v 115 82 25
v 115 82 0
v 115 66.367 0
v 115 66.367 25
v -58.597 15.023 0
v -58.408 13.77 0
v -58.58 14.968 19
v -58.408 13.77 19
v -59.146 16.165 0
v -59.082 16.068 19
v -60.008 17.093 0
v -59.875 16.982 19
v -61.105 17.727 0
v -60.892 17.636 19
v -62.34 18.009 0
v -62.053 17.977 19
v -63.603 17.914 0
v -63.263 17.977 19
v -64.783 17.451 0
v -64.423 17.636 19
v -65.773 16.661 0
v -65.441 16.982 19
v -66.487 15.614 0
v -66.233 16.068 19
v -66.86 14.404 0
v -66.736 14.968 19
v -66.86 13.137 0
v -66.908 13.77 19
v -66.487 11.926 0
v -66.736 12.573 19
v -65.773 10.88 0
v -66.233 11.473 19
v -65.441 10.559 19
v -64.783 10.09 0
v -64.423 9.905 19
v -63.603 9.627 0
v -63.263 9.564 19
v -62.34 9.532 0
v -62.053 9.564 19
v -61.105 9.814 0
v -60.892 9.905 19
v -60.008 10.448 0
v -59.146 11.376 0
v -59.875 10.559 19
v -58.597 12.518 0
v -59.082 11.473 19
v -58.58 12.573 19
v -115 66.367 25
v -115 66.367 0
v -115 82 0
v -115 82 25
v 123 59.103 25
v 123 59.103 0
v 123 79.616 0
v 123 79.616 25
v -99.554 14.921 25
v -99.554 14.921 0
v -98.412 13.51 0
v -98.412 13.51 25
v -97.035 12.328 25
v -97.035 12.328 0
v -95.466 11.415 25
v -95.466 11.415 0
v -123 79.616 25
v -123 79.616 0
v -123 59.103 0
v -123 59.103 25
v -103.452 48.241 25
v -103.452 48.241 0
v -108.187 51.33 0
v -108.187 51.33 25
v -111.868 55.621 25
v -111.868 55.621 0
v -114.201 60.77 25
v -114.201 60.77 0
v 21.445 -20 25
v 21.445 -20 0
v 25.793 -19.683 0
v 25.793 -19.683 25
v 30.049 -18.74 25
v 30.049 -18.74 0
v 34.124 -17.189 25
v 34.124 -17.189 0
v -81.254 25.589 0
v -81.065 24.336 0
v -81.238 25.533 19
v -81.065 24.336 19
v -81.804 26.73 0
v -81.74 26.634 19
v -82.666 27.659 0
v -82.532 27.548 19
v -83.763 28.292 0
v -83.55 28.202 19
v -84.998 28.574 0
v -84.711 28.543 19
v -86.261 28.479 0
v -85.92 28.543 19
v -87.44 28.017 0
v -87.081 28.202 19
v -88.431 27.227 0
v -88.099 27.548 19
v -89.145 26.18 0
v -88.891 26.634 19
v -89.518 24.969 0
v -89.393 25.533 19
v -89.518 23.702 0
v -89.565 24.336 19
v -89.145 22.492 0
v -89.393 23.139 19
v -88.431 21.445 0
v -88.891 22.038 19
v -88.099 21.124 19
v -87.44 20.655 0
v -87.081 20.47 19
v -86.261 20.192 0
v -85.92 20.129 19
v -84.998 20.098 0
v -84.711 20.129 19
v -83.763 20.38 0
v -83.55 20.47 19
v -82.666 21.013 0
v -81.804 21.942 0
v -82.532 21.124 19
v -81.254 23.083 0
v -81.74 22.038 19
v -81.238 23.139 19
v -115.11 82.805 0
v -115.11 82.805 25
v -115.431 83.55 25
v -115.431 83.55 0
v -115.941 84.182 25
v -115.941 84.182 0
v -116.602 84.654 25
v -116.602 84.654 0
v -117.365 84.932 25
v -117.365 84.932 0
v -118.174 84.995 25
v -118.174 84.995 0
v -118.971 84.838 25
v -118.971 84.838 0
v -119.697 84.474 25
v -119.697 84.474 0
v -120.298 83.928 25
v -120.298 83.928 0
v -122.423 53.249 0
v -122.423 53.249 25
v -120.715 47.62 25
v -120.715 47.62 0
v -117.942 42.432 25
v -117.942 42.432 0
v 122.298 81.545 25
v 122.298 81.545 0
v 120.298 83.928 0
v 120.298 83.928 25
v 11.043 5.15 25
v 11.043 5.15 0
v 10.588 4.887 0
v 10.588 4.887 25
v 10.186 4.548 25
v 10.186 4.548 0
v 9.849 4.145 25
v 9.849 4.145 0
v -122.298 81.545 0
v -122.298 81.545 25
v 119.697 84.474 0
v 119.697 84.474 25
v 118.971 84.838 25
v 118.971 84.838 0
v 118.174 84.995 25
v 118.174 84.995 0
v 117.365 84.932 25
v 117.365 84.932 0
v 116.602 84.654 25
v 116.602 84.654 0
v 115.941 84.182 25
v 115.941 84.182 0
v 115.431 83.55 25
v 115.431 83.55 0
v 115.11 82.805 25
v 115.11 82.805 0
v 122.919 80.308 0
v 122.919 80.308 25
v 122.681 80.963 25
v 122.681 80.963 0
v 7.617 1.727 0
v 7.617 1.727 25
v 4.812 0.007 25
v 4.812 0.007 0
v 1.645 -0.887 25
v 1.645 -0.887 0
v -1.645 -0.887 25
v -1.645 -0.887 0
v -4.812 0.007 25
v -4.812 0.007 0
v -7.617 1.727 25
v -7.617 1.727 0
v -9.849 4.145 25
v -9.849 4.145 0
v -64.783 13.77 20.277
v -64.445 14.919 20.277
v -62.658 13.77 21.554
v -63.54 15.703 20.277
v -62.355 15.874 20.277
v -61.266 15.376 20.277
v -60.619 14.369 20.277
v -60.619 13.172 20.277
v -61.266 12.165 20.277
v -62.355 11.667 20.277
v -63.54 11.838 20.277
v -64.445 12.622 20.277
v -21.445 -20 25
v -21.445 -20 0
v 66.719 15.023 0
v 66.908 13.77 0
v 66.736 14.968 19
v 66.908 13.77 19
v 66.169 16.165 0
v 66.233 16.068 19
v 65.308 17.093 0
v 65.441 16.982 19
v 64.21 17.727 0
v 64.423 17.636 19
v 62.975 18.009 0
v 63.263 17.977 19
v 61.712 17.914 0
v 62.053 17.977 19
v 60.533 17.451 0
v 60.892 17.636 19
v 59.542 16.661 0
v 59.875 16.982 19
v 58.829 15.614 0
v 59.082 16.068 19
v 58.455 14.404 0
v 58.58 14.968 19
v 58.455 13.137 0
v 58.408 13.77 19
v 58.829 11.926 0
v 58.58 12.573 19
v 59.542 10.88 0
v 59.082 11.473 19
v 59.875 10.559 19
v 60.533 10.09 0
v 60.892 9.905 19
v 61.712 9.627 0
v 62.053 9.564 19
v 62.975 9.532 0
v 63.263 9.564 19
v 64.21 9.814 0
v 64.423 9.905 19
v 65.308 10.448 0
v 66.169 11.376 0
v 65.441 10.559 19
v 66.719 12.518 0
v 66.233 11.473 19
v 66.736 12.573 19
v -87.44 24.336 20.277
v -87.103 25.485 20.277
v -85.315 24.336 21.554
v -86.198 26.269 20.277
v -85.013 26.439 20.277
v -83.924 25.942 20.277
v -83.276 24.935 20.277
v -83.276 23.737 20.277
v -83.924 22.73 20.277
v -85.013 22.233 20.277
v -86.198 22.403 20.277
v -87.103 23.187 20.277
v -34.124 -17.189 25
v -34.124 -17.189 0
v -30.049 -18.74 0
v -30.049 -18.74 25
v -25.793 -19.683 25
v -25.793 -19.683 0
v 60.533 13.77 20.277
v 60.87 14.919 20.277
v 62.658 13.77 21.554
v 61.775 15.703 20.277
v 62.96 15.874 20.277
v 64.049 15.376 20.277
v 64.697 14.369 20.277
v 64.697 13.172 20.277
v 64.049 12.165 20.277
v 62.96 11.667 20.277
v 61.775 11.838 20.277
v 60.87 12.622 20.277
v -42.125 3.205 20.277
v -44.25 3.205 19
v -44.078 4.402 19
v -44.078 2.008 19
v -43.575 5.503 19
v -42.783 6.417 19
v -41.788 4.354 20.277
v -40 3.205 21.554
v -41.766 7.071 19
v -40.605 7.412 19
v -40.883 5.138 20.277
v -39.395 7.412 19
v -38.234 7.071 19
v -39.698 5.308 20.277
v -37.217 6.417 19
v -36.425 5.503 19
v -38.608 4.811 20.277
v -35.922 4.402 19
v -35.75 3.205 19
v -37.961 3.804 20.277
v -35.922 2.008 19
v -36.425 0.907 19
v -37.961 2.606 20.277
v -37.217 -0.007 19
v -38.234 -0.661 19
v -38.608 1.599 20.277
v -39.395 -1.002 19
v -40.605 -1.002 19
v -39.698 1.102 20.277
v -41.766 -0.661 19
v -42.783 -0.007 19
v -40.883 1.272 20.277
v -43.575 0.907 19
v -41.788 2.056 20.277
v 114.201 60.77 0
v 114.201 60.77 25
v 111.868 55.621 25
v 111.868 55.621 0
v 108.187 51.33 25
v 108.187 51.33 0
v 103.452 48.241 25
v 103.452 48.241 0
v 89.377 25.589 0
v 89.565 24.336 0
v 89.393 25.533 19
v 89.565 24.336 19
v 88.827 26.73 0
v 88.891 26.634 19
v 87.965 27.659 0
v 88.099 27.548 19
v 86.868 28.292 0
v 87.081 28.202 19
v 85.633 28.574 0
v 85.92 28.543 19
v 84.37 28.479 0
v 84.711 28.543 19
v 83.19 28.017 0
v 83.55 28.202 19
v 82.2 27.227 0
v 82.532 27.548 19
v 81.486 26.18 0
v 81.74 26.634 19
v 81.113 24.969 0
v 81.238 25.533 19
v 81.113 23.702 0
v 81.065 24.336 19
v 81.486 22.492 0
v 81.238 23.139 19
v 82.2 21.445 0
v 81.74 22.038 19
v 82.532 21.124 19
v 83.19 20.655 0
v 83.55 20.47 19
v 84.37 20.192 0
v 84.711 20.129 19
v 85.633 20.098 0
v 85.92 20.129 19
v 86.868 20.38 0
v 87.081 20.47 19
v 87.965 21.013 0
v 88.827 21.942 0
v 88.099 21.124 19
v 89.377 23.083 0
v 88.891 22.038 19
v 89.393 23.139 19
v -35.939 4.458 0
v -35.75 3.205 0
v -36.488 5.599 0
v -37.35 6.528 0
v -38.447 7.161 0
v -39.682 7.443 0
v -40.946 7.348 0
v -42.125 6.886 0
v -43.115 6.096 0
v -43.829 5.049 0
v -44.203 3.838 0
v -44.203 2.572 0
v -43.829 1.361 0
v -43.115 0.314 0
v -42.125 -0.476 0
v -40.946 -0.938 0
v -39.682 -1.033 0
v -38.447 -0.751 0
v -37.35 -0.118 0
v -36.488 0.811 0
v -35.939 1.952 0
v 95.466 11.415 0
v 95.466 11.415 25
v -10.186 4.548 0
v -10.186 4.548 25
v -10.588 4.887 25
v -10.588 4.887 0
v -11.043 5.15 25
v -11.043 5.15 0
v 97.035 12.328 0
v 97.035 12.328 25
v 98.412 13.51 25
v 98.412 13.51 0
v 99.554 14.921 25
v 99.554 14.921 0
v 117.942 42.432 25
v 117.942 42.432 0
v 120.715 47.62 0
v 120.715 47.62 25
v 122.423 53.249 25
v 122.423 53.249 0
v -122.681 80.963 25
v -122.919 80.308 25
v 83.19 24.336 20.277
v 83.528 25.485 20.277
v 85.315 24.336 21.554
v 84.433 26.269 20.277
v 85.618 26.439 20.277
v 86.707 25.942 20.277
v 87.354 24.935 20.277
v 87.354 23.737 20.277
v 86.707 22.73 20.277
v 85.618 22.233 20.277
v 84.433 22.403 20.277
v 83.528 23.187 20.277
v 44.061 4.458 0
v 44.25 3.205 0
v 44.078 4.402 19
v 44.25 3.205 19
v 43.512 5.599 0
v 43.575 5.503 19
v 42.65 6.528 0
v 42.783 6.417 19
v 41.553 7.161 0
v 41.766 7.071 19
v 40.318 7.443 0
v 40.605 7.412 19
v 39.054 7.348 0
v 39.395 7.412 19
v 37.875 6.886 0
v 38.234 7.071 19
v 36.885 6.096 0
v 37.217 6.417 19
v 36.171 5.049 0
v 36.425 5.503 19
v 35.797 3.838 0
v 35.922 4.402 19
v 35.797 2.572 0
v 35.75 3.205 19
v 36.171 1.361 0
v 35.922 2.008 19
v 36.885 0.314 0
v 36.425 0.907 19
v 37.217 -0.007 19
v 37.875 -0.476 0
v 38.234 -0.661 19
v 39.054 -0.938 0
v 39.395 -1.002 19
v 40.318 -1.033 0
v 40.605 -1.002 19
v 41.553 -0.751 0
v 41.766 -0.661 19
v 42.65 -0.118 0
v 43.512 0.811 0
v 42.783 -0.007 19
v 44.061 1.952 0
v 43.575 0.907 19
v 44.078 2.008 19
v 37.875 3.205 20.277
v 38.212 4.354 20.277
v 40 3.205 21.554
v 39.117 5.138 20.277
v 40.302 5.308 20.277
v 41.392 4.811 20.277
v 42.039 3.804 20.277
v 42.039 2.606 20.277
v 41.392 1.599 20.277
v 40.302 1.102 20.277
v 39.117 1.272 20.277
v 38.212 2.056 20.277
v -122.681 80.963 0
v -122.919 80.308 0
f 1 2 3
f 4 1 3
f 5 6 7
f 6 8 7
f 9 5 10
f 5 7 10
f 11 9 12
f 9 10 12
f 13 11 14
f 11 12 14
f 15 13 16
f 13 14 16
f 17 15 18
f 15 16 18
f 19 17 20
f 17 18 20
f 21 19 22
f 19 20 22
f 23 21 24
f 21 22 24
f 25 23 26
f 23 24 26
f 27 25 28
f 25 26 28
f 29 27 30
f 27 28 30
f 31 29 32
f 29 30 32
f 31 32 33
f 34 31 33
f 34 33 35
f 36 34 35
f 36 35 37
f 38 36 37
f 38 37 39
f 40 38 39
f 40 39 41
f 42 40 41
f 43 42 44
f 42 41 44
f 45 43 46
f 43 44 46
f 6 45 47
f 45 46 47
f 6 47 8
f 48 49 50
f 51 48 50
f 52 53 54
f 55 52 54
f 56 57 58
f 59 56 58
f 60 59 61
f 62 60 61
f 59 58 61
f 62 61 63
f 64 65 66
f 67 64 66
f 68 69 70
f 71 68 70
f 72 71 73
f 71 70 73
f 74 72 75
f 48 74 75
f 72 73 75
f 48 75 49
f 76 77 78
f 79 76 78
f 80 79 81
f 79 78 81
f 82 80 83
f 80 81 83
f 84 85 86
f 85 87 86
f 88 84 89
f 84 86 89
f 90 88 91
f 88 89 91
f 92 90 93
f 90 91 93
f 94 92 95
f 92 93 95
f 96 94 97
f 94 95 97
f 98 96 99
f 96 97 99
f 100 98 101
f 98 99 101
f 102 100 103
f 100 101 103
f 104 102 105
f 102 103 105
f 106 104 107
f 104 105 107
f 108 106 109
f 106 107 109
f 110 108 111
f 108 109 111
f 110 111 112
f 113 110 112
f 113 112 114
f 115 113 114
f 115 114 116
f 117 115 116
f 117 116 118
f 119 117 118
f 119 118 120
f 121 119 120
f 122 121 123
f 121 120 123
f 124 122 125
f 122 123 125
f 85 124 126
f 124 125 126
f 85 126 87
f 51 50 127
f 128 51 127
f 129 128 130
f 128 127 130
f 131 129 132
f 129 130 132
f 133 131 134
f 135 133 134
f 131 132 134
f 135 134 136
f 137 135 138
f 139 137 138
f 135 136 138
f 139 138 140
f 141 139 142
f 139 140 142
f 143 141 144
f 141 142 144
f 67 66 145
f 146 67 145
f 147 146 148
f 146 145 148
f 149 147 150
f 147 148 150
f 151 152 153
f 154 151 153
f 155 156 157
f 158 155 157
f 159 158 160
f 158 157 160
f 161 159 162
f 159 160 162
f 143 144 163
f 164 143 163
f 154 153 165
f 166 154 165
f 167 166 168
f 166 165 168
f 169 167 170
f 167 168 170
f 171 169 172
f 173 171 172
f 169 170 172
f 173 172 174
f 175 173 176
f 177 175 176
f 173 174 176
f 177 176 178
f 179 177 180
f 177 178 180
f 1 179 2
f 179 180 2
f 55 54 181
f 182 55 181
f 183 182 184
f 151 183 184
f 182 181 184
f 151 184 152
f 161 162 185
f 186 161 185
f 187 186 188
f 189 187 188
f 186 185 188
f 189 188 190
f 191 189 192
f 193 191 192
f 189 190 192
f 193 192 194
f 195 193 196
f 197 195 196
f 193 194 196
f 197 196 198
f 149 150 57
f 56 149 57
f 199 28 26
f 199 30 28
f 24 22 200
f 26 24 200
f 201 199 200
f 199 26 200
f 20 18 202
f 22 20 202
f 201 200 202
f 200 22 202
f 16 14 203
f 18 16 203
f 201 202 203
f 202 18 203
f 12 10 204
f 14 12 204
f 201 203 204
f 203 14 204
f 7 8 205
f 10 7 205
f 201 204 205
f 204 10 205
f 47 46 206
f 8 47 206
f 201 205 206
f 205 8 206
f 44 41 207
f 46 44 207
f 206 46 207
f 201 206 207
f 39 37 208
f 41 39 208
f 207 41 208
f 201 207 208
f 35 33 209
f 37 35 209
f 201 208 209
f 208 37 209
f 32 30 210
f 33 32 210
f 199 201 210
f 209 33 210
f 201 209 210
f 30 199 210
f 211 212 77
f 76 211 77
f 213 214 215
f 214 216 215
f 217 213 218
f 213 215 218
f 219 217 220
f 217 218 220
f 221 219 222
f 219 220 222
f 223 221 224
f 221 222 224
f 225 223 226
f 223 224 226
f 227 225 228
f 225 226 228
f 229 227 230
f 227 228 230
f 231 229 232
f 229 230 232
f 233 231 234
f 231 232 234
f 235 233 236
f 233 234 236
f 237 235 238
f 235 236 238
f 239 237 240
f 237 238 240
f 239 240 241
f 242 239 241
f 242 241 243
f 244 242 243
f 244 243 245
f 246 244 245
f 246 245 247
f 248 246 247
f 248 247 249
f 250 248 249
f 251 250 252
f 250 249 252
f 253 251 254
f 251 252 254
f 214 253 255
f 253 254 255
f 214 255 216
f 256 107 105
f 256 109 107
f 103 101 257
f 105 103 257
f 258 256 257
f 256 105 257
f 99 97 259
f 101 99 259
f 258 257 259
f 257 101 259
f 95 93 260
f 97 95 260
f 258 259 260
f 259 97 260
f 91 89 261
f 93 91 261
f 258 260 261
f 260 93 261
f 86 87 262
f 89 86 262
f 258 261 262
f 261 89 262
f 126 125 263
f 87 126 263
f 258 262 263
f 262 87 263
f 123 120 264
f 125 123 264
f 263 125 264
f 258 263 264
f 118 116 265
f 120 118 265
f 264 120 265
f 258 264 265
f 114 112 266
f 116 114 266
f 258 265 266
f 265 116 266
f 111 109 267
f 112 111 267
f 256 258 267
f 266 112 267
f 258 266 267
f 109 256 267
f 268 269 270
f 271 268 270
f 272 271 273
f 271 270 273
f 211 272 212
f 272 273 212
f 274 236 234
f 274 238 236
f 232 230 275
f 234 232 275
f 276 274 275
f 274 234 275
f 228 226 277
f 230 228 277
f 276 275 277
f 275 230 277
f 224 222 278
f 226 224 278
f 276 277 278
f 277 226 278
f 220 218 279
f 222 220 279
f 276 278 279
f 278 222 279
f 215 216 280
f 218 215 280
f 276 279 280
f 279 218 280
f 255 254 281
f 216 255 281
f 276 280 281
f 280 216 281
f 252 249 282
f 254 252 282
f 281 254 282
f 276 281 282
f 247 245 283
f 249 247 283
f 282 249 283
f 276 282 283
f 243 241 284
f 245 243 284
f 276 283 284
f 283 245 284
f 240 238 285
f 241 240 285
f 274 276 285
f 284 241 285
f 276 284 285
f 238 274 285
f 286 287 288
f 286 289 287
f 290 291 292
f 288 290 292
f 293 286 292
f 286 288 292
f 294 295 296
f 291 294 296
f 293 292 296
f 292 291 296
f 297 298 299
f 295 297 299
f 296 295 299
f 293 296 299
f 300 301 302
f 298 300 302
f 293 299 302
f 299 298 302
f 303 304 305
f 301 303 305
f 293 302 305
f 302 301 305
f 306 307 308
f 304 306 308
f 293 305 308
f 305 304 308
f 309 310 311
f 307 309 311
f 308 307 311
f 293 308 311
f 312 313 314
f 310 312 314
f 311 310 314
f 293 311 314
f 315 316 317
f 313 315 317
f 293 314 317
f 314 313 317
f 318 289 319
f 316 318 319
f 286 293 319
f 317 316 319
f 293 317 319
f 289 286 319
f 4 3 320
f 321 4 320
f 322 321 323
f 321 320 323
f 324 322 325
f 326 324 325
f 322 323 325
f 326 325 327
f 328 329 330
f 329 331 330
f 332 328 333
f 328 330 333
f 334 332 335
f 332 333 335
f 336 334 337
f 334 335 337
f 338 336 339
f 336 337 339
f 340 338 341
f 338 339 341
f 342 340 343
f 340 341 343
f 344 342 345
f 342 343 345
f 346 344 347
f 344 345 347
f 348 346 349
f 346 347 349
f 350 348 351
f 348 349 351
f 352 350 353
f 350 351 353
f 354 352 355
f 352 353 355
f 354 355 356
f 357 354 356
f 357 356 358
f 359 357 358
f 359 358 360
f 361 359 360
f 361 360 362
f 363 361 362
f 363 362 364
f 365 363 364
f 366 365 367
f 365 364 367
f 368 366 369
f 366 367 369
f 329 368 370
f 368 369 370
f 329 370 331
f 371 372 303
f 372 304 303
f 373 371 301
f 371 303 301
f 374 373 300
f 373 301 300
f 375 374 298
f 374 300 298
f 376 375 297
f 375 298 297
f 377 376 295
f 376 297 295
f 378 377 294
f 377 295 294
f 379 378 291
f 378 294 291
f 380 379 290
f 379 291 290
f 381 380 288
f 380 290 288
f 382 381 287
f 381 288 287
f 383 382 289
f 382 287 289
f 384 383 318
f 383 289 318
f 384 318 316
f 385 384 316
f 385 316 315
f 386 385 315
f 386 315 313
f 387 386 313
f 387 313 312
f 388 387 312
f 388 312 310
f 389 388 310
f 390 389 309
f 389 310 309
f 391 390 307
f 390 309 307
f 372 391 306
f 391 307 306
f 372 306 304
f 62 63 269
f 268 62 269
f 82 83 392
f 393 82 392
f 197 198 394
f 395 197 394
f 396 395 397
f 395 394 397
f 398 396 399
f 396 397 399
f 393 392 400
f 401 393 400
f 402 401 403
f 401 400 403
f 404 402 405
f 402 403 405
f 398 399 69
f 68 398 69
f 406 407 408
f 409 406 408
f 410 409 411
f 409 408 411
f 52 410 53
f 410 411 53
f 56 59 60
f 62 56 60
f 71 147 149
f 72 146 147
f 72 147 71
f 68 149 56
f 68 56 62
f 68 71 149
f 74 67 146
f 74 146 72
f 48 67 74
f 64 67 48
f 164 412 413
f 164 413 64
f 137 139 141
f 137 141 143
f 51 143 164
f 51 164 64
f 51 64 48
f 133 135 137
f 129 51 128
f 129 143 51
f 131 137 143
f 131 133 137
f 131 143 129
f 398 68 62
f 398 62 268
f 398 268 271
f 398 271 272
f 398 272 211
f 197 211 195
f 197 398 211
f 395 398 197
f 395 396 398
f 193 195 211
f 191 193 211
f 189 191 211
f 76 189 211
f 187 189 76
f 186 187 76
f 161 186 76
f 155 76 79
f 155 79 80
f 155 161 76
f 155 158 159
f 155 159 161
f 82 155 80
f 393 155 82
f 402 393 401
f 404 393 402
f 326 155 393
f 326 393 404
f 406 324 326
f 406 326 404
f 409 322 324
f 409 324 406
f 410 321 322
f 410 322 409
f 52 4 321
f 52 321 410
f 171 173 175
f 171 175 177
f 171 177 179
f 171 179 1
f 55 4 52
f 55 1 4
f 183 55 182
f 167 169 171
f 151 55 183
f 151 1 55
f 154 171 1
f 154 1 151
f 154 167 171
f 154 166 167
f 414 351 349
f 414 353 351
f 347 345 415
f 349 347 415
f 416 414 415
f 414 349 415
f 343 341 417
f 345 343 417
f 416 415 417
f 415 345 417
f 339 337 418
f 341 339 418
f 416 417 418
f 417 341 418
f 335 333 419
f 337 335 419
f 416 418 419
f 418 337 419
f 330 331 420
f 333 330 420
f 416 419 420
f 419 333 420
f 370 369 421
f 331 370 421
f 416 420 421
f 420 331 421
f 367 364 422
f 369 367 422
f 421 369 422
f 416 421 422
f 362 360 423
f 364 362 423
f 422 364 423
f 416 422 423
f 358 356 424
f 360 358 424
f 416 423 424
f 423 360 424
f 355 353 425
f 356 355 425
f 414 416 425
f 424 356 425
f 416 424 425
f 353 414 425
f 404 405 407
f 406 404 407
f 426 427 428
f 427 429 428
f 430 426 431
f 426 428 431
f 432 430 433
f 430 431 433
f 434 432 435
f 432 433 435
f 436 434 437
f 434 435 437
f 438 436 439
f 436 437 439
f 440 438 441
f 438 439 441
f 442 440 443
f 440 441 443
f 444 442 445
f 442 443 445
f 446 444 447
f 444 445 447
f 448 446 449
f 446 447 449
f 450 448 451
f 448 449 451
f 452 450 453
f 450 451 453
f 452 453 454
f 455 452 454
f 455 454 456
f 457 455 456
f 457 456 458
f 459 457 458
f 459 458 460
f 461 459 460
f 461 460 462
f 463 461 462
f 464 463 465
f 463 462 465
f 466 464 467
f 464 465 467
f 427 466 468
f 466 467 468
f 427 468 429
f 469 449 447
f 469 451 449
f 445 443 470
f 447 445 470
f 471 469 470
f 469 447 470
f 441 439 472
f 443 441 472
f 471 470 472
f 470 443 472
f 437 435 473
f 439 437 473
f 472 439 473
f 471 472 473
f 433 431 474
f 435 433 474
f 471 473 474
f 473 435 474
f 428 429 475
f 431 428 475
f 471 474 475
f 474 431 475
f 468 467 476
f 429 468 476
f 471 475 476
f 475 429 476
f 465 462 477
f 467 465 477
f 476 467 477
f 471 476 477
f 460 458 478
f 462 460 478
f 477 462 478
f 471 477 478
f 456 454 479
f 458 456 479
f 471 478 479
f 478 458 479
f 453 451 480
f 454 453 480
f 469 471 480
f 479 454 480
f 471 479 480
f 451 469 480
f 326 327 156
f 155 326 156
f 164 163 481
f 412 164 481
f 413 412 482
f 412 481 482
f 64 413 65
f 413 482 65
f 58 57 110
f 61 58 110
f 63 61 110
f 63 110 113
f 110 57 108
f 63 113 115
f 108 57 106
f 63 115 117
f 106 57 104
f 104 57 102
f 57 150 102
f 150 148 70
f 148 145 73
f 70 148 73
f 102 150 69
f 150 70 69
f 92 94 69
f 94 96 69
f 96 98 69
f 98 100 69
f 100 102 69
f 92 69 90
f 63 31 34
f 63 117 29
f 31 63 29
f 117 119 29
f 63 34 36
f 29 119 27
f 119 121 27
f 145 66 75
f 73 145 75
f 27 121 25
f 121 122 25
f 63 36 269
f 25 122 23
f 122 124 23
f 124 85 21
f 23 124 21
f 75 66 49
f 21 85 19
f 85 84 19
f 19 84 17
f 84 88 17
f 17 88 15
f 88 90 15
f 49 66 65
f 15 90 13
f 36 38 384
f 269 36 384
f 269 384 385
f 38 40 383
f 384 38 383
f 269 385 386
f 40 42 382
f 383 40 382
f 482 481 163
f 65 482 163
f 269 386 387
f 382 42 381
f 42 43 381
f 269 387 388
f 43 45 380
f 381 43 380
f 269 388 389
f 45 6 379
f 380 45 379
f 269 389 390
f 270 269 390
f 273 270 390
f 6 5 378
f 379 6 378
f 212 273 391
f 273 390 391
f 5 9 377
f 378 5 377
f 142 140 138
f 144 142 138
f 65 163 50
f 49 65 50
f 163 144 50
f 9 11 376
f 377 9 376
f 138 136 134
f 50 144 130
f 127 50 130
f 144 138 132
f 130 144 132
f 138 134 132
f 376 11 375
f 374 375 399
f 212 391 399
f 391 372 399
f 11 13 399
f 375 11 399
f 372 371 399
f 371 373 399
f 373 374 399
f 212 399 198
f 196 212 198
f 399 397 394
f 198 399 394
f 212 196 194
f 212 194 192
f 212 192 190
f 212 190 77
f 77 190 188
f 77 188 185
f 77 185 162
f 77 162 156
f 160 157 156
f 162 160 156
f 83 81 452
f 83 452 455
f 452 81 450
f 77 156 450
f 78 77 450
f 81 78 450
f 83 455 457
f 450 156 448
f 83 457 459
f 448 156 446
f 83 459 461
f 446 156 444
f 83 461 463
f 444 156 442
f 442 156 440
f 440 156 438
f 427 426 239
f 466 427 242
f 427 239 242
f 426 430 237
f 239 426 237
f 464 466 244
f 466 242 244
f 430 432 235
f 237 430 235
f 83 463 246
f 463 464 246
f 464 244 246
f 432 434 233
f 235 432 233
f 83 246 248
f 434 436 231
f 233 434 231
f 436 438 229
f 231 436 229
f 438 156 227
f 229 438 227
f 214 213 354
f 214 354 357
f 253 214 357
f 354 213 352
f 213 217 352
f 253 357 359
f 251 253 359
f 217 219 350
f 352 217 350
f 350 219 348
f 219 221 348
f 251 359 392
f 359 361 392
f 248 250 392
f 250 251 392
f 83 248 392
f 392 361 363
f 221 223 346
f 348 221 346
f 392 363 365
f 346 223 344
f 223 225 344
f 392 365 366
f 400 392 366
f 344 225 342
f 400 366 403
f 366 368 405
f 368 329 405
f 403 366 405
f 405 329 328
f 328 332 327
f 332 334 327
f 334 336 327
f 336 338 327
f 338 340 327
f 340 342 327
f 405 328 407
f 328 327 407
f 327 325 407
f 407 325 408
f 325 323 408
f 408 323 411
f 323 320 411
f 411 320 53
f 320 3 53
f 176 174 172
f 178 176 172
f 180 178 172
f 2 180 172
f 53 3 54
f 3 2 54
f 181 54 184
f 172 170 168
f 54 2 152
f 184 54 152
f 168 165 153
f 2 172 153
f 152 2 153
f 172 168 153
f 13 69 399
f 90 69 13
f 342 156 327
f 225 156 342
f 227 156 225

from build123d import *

# Parameters (mm, degrees)
BASE_EXTRUDE_DEPTH     = 25
M10_GEVINDHULLER_D     = 8.5
M10_GEVINDHULLER_DEPTH = 19
M10_GEVINDHULLER_TIP   = 2.553657631


with BuildPart() as part:
    # Sketch1 → Base-Extrude (new body)
    with BuildSketch(Plane.XY):
        with BuildLine():
            Line((-11.04340479, 5.149624226), (-103.452365235, 48.240630163))
            ThreePointArc((-103.452365235, 48.240630163), (-111.867828916, 55.620793737), (-115, 66.366785904))
            Line((-115, 66.366785904), (-115, 82))
            ThreePointArc((-115, 82), (-116.97393957, 84.819077862), (-120.298133329, 83.928362829))
            Line((-120.298133329, 83.928362829), (-122.298133329, 81.544855644))
            ThreePointArc((-122.298133329, 81.544855644), (-122.819077862, 80.642553245), (-123, 79.616492815))
            Line((-123, 79.616492815), (-123, 59.102819238))
            ThreePointArc((-123, 59.102819238), (-121.707567052, 50.39215945), (-117.941627071, 42.432029243))
            Line((-117.941627071, 42.432029243), (-99.553694394, 14.921337813))
            ThreePointArc((-99.553694394, 14.921337813), (-97.750312833, 12.887914315), (-95.466001321, 11.41518994))
            Line((-95.466001321, 11.41518994), (-34.123617057, -17.189233611))
            ThreePointArc((-34.123617057, -17.189233611), (-27.938257623, -19.288880214), (-21.445069205, -20))
            Line((-21.445069205, -20), (21.445069205, -20))
            ThreePointArc((21.445069205, -20), (27.938257623, -19.288880214), (34.123617057, -17.189233611))
            Line((34.123617057, -17.189233611), (95.466001321, 11.41518994))
            ThreePointArc((95.466001321, 11.41518994), (97.750312833, 12.887914315), (99.553694394, 14.921337813))
            Line((99.553694394, 14.921337813), (117.941627071, 42.432029243))
            ThreePointArc((117.941627071, 42.432029243), (121.707567052, 50.39215945), (123, 59.102819238))
            Line((123, 59.102819238), (123, 79.616492815))
            ThreePointArc((123, 79.616492815), (122.819077862, 80.642553245), (122.298133329, 81.544855644))
            Line((122.298133329, 81.544855644), (120.298133329, 83.928362829))
            ThreePointArc((120.298133329, 83.928362829), (116.97393957, 84.819077862), (115, 82))
            Line((115, 82), (115, 66.366785904))
            ThreePointArc((115, 66.366785904), (111.867828916, 55.620793737), (103.452365235, 48.240630163))
            Line((103.452365235, 48.240630163), (11.04340479, 5.149624226))
            ThreePointArc((11.04340479, 5.149624226), (10.379689702, 4.726139346), (9.84900766, 4.144560692))
            ThreePointArc((9.84900766, 4.144560692), (0, -1), (-9.84900766, 4.144560692))
            ThreePointArc((-9.84900766, 4.144560692), (-10.379689702, 4.726139346), (-11.04340479, 5.149624226))
        make_face()
    extrude(amount=BASE_EXTRUDE_DEPTH)

    # M10 gevindhuller
    with Locations(Plane(origin=(0, 0, 0), x_dir=(-1, 0, 0), z_dir=(0, 0, -1))):
        with Locations((-40, 3.205015461), (-62.657694676, 13.770472004), (-85.315389352, 24.335928548), (85.315389352, 24.335928548), (62.657694676, 13.770472004), (40, 3.205015461)):
            Hole(M10_GEVINDHULLER_D / 2, depth=M10_GEVINDHULLER_DEPTH)
            with Locations((0, 0, -(M10_GEVINDHULLER_DEPTH + M10_GEVINDHULLER_TIP / 2))):  # 118° drill point
                Cone(0, M10_GEVINDHULLER_D / 2, M10_GEVINDHULLER_TIP, mode=Mode.SUBTRACT)


solid = part.part
